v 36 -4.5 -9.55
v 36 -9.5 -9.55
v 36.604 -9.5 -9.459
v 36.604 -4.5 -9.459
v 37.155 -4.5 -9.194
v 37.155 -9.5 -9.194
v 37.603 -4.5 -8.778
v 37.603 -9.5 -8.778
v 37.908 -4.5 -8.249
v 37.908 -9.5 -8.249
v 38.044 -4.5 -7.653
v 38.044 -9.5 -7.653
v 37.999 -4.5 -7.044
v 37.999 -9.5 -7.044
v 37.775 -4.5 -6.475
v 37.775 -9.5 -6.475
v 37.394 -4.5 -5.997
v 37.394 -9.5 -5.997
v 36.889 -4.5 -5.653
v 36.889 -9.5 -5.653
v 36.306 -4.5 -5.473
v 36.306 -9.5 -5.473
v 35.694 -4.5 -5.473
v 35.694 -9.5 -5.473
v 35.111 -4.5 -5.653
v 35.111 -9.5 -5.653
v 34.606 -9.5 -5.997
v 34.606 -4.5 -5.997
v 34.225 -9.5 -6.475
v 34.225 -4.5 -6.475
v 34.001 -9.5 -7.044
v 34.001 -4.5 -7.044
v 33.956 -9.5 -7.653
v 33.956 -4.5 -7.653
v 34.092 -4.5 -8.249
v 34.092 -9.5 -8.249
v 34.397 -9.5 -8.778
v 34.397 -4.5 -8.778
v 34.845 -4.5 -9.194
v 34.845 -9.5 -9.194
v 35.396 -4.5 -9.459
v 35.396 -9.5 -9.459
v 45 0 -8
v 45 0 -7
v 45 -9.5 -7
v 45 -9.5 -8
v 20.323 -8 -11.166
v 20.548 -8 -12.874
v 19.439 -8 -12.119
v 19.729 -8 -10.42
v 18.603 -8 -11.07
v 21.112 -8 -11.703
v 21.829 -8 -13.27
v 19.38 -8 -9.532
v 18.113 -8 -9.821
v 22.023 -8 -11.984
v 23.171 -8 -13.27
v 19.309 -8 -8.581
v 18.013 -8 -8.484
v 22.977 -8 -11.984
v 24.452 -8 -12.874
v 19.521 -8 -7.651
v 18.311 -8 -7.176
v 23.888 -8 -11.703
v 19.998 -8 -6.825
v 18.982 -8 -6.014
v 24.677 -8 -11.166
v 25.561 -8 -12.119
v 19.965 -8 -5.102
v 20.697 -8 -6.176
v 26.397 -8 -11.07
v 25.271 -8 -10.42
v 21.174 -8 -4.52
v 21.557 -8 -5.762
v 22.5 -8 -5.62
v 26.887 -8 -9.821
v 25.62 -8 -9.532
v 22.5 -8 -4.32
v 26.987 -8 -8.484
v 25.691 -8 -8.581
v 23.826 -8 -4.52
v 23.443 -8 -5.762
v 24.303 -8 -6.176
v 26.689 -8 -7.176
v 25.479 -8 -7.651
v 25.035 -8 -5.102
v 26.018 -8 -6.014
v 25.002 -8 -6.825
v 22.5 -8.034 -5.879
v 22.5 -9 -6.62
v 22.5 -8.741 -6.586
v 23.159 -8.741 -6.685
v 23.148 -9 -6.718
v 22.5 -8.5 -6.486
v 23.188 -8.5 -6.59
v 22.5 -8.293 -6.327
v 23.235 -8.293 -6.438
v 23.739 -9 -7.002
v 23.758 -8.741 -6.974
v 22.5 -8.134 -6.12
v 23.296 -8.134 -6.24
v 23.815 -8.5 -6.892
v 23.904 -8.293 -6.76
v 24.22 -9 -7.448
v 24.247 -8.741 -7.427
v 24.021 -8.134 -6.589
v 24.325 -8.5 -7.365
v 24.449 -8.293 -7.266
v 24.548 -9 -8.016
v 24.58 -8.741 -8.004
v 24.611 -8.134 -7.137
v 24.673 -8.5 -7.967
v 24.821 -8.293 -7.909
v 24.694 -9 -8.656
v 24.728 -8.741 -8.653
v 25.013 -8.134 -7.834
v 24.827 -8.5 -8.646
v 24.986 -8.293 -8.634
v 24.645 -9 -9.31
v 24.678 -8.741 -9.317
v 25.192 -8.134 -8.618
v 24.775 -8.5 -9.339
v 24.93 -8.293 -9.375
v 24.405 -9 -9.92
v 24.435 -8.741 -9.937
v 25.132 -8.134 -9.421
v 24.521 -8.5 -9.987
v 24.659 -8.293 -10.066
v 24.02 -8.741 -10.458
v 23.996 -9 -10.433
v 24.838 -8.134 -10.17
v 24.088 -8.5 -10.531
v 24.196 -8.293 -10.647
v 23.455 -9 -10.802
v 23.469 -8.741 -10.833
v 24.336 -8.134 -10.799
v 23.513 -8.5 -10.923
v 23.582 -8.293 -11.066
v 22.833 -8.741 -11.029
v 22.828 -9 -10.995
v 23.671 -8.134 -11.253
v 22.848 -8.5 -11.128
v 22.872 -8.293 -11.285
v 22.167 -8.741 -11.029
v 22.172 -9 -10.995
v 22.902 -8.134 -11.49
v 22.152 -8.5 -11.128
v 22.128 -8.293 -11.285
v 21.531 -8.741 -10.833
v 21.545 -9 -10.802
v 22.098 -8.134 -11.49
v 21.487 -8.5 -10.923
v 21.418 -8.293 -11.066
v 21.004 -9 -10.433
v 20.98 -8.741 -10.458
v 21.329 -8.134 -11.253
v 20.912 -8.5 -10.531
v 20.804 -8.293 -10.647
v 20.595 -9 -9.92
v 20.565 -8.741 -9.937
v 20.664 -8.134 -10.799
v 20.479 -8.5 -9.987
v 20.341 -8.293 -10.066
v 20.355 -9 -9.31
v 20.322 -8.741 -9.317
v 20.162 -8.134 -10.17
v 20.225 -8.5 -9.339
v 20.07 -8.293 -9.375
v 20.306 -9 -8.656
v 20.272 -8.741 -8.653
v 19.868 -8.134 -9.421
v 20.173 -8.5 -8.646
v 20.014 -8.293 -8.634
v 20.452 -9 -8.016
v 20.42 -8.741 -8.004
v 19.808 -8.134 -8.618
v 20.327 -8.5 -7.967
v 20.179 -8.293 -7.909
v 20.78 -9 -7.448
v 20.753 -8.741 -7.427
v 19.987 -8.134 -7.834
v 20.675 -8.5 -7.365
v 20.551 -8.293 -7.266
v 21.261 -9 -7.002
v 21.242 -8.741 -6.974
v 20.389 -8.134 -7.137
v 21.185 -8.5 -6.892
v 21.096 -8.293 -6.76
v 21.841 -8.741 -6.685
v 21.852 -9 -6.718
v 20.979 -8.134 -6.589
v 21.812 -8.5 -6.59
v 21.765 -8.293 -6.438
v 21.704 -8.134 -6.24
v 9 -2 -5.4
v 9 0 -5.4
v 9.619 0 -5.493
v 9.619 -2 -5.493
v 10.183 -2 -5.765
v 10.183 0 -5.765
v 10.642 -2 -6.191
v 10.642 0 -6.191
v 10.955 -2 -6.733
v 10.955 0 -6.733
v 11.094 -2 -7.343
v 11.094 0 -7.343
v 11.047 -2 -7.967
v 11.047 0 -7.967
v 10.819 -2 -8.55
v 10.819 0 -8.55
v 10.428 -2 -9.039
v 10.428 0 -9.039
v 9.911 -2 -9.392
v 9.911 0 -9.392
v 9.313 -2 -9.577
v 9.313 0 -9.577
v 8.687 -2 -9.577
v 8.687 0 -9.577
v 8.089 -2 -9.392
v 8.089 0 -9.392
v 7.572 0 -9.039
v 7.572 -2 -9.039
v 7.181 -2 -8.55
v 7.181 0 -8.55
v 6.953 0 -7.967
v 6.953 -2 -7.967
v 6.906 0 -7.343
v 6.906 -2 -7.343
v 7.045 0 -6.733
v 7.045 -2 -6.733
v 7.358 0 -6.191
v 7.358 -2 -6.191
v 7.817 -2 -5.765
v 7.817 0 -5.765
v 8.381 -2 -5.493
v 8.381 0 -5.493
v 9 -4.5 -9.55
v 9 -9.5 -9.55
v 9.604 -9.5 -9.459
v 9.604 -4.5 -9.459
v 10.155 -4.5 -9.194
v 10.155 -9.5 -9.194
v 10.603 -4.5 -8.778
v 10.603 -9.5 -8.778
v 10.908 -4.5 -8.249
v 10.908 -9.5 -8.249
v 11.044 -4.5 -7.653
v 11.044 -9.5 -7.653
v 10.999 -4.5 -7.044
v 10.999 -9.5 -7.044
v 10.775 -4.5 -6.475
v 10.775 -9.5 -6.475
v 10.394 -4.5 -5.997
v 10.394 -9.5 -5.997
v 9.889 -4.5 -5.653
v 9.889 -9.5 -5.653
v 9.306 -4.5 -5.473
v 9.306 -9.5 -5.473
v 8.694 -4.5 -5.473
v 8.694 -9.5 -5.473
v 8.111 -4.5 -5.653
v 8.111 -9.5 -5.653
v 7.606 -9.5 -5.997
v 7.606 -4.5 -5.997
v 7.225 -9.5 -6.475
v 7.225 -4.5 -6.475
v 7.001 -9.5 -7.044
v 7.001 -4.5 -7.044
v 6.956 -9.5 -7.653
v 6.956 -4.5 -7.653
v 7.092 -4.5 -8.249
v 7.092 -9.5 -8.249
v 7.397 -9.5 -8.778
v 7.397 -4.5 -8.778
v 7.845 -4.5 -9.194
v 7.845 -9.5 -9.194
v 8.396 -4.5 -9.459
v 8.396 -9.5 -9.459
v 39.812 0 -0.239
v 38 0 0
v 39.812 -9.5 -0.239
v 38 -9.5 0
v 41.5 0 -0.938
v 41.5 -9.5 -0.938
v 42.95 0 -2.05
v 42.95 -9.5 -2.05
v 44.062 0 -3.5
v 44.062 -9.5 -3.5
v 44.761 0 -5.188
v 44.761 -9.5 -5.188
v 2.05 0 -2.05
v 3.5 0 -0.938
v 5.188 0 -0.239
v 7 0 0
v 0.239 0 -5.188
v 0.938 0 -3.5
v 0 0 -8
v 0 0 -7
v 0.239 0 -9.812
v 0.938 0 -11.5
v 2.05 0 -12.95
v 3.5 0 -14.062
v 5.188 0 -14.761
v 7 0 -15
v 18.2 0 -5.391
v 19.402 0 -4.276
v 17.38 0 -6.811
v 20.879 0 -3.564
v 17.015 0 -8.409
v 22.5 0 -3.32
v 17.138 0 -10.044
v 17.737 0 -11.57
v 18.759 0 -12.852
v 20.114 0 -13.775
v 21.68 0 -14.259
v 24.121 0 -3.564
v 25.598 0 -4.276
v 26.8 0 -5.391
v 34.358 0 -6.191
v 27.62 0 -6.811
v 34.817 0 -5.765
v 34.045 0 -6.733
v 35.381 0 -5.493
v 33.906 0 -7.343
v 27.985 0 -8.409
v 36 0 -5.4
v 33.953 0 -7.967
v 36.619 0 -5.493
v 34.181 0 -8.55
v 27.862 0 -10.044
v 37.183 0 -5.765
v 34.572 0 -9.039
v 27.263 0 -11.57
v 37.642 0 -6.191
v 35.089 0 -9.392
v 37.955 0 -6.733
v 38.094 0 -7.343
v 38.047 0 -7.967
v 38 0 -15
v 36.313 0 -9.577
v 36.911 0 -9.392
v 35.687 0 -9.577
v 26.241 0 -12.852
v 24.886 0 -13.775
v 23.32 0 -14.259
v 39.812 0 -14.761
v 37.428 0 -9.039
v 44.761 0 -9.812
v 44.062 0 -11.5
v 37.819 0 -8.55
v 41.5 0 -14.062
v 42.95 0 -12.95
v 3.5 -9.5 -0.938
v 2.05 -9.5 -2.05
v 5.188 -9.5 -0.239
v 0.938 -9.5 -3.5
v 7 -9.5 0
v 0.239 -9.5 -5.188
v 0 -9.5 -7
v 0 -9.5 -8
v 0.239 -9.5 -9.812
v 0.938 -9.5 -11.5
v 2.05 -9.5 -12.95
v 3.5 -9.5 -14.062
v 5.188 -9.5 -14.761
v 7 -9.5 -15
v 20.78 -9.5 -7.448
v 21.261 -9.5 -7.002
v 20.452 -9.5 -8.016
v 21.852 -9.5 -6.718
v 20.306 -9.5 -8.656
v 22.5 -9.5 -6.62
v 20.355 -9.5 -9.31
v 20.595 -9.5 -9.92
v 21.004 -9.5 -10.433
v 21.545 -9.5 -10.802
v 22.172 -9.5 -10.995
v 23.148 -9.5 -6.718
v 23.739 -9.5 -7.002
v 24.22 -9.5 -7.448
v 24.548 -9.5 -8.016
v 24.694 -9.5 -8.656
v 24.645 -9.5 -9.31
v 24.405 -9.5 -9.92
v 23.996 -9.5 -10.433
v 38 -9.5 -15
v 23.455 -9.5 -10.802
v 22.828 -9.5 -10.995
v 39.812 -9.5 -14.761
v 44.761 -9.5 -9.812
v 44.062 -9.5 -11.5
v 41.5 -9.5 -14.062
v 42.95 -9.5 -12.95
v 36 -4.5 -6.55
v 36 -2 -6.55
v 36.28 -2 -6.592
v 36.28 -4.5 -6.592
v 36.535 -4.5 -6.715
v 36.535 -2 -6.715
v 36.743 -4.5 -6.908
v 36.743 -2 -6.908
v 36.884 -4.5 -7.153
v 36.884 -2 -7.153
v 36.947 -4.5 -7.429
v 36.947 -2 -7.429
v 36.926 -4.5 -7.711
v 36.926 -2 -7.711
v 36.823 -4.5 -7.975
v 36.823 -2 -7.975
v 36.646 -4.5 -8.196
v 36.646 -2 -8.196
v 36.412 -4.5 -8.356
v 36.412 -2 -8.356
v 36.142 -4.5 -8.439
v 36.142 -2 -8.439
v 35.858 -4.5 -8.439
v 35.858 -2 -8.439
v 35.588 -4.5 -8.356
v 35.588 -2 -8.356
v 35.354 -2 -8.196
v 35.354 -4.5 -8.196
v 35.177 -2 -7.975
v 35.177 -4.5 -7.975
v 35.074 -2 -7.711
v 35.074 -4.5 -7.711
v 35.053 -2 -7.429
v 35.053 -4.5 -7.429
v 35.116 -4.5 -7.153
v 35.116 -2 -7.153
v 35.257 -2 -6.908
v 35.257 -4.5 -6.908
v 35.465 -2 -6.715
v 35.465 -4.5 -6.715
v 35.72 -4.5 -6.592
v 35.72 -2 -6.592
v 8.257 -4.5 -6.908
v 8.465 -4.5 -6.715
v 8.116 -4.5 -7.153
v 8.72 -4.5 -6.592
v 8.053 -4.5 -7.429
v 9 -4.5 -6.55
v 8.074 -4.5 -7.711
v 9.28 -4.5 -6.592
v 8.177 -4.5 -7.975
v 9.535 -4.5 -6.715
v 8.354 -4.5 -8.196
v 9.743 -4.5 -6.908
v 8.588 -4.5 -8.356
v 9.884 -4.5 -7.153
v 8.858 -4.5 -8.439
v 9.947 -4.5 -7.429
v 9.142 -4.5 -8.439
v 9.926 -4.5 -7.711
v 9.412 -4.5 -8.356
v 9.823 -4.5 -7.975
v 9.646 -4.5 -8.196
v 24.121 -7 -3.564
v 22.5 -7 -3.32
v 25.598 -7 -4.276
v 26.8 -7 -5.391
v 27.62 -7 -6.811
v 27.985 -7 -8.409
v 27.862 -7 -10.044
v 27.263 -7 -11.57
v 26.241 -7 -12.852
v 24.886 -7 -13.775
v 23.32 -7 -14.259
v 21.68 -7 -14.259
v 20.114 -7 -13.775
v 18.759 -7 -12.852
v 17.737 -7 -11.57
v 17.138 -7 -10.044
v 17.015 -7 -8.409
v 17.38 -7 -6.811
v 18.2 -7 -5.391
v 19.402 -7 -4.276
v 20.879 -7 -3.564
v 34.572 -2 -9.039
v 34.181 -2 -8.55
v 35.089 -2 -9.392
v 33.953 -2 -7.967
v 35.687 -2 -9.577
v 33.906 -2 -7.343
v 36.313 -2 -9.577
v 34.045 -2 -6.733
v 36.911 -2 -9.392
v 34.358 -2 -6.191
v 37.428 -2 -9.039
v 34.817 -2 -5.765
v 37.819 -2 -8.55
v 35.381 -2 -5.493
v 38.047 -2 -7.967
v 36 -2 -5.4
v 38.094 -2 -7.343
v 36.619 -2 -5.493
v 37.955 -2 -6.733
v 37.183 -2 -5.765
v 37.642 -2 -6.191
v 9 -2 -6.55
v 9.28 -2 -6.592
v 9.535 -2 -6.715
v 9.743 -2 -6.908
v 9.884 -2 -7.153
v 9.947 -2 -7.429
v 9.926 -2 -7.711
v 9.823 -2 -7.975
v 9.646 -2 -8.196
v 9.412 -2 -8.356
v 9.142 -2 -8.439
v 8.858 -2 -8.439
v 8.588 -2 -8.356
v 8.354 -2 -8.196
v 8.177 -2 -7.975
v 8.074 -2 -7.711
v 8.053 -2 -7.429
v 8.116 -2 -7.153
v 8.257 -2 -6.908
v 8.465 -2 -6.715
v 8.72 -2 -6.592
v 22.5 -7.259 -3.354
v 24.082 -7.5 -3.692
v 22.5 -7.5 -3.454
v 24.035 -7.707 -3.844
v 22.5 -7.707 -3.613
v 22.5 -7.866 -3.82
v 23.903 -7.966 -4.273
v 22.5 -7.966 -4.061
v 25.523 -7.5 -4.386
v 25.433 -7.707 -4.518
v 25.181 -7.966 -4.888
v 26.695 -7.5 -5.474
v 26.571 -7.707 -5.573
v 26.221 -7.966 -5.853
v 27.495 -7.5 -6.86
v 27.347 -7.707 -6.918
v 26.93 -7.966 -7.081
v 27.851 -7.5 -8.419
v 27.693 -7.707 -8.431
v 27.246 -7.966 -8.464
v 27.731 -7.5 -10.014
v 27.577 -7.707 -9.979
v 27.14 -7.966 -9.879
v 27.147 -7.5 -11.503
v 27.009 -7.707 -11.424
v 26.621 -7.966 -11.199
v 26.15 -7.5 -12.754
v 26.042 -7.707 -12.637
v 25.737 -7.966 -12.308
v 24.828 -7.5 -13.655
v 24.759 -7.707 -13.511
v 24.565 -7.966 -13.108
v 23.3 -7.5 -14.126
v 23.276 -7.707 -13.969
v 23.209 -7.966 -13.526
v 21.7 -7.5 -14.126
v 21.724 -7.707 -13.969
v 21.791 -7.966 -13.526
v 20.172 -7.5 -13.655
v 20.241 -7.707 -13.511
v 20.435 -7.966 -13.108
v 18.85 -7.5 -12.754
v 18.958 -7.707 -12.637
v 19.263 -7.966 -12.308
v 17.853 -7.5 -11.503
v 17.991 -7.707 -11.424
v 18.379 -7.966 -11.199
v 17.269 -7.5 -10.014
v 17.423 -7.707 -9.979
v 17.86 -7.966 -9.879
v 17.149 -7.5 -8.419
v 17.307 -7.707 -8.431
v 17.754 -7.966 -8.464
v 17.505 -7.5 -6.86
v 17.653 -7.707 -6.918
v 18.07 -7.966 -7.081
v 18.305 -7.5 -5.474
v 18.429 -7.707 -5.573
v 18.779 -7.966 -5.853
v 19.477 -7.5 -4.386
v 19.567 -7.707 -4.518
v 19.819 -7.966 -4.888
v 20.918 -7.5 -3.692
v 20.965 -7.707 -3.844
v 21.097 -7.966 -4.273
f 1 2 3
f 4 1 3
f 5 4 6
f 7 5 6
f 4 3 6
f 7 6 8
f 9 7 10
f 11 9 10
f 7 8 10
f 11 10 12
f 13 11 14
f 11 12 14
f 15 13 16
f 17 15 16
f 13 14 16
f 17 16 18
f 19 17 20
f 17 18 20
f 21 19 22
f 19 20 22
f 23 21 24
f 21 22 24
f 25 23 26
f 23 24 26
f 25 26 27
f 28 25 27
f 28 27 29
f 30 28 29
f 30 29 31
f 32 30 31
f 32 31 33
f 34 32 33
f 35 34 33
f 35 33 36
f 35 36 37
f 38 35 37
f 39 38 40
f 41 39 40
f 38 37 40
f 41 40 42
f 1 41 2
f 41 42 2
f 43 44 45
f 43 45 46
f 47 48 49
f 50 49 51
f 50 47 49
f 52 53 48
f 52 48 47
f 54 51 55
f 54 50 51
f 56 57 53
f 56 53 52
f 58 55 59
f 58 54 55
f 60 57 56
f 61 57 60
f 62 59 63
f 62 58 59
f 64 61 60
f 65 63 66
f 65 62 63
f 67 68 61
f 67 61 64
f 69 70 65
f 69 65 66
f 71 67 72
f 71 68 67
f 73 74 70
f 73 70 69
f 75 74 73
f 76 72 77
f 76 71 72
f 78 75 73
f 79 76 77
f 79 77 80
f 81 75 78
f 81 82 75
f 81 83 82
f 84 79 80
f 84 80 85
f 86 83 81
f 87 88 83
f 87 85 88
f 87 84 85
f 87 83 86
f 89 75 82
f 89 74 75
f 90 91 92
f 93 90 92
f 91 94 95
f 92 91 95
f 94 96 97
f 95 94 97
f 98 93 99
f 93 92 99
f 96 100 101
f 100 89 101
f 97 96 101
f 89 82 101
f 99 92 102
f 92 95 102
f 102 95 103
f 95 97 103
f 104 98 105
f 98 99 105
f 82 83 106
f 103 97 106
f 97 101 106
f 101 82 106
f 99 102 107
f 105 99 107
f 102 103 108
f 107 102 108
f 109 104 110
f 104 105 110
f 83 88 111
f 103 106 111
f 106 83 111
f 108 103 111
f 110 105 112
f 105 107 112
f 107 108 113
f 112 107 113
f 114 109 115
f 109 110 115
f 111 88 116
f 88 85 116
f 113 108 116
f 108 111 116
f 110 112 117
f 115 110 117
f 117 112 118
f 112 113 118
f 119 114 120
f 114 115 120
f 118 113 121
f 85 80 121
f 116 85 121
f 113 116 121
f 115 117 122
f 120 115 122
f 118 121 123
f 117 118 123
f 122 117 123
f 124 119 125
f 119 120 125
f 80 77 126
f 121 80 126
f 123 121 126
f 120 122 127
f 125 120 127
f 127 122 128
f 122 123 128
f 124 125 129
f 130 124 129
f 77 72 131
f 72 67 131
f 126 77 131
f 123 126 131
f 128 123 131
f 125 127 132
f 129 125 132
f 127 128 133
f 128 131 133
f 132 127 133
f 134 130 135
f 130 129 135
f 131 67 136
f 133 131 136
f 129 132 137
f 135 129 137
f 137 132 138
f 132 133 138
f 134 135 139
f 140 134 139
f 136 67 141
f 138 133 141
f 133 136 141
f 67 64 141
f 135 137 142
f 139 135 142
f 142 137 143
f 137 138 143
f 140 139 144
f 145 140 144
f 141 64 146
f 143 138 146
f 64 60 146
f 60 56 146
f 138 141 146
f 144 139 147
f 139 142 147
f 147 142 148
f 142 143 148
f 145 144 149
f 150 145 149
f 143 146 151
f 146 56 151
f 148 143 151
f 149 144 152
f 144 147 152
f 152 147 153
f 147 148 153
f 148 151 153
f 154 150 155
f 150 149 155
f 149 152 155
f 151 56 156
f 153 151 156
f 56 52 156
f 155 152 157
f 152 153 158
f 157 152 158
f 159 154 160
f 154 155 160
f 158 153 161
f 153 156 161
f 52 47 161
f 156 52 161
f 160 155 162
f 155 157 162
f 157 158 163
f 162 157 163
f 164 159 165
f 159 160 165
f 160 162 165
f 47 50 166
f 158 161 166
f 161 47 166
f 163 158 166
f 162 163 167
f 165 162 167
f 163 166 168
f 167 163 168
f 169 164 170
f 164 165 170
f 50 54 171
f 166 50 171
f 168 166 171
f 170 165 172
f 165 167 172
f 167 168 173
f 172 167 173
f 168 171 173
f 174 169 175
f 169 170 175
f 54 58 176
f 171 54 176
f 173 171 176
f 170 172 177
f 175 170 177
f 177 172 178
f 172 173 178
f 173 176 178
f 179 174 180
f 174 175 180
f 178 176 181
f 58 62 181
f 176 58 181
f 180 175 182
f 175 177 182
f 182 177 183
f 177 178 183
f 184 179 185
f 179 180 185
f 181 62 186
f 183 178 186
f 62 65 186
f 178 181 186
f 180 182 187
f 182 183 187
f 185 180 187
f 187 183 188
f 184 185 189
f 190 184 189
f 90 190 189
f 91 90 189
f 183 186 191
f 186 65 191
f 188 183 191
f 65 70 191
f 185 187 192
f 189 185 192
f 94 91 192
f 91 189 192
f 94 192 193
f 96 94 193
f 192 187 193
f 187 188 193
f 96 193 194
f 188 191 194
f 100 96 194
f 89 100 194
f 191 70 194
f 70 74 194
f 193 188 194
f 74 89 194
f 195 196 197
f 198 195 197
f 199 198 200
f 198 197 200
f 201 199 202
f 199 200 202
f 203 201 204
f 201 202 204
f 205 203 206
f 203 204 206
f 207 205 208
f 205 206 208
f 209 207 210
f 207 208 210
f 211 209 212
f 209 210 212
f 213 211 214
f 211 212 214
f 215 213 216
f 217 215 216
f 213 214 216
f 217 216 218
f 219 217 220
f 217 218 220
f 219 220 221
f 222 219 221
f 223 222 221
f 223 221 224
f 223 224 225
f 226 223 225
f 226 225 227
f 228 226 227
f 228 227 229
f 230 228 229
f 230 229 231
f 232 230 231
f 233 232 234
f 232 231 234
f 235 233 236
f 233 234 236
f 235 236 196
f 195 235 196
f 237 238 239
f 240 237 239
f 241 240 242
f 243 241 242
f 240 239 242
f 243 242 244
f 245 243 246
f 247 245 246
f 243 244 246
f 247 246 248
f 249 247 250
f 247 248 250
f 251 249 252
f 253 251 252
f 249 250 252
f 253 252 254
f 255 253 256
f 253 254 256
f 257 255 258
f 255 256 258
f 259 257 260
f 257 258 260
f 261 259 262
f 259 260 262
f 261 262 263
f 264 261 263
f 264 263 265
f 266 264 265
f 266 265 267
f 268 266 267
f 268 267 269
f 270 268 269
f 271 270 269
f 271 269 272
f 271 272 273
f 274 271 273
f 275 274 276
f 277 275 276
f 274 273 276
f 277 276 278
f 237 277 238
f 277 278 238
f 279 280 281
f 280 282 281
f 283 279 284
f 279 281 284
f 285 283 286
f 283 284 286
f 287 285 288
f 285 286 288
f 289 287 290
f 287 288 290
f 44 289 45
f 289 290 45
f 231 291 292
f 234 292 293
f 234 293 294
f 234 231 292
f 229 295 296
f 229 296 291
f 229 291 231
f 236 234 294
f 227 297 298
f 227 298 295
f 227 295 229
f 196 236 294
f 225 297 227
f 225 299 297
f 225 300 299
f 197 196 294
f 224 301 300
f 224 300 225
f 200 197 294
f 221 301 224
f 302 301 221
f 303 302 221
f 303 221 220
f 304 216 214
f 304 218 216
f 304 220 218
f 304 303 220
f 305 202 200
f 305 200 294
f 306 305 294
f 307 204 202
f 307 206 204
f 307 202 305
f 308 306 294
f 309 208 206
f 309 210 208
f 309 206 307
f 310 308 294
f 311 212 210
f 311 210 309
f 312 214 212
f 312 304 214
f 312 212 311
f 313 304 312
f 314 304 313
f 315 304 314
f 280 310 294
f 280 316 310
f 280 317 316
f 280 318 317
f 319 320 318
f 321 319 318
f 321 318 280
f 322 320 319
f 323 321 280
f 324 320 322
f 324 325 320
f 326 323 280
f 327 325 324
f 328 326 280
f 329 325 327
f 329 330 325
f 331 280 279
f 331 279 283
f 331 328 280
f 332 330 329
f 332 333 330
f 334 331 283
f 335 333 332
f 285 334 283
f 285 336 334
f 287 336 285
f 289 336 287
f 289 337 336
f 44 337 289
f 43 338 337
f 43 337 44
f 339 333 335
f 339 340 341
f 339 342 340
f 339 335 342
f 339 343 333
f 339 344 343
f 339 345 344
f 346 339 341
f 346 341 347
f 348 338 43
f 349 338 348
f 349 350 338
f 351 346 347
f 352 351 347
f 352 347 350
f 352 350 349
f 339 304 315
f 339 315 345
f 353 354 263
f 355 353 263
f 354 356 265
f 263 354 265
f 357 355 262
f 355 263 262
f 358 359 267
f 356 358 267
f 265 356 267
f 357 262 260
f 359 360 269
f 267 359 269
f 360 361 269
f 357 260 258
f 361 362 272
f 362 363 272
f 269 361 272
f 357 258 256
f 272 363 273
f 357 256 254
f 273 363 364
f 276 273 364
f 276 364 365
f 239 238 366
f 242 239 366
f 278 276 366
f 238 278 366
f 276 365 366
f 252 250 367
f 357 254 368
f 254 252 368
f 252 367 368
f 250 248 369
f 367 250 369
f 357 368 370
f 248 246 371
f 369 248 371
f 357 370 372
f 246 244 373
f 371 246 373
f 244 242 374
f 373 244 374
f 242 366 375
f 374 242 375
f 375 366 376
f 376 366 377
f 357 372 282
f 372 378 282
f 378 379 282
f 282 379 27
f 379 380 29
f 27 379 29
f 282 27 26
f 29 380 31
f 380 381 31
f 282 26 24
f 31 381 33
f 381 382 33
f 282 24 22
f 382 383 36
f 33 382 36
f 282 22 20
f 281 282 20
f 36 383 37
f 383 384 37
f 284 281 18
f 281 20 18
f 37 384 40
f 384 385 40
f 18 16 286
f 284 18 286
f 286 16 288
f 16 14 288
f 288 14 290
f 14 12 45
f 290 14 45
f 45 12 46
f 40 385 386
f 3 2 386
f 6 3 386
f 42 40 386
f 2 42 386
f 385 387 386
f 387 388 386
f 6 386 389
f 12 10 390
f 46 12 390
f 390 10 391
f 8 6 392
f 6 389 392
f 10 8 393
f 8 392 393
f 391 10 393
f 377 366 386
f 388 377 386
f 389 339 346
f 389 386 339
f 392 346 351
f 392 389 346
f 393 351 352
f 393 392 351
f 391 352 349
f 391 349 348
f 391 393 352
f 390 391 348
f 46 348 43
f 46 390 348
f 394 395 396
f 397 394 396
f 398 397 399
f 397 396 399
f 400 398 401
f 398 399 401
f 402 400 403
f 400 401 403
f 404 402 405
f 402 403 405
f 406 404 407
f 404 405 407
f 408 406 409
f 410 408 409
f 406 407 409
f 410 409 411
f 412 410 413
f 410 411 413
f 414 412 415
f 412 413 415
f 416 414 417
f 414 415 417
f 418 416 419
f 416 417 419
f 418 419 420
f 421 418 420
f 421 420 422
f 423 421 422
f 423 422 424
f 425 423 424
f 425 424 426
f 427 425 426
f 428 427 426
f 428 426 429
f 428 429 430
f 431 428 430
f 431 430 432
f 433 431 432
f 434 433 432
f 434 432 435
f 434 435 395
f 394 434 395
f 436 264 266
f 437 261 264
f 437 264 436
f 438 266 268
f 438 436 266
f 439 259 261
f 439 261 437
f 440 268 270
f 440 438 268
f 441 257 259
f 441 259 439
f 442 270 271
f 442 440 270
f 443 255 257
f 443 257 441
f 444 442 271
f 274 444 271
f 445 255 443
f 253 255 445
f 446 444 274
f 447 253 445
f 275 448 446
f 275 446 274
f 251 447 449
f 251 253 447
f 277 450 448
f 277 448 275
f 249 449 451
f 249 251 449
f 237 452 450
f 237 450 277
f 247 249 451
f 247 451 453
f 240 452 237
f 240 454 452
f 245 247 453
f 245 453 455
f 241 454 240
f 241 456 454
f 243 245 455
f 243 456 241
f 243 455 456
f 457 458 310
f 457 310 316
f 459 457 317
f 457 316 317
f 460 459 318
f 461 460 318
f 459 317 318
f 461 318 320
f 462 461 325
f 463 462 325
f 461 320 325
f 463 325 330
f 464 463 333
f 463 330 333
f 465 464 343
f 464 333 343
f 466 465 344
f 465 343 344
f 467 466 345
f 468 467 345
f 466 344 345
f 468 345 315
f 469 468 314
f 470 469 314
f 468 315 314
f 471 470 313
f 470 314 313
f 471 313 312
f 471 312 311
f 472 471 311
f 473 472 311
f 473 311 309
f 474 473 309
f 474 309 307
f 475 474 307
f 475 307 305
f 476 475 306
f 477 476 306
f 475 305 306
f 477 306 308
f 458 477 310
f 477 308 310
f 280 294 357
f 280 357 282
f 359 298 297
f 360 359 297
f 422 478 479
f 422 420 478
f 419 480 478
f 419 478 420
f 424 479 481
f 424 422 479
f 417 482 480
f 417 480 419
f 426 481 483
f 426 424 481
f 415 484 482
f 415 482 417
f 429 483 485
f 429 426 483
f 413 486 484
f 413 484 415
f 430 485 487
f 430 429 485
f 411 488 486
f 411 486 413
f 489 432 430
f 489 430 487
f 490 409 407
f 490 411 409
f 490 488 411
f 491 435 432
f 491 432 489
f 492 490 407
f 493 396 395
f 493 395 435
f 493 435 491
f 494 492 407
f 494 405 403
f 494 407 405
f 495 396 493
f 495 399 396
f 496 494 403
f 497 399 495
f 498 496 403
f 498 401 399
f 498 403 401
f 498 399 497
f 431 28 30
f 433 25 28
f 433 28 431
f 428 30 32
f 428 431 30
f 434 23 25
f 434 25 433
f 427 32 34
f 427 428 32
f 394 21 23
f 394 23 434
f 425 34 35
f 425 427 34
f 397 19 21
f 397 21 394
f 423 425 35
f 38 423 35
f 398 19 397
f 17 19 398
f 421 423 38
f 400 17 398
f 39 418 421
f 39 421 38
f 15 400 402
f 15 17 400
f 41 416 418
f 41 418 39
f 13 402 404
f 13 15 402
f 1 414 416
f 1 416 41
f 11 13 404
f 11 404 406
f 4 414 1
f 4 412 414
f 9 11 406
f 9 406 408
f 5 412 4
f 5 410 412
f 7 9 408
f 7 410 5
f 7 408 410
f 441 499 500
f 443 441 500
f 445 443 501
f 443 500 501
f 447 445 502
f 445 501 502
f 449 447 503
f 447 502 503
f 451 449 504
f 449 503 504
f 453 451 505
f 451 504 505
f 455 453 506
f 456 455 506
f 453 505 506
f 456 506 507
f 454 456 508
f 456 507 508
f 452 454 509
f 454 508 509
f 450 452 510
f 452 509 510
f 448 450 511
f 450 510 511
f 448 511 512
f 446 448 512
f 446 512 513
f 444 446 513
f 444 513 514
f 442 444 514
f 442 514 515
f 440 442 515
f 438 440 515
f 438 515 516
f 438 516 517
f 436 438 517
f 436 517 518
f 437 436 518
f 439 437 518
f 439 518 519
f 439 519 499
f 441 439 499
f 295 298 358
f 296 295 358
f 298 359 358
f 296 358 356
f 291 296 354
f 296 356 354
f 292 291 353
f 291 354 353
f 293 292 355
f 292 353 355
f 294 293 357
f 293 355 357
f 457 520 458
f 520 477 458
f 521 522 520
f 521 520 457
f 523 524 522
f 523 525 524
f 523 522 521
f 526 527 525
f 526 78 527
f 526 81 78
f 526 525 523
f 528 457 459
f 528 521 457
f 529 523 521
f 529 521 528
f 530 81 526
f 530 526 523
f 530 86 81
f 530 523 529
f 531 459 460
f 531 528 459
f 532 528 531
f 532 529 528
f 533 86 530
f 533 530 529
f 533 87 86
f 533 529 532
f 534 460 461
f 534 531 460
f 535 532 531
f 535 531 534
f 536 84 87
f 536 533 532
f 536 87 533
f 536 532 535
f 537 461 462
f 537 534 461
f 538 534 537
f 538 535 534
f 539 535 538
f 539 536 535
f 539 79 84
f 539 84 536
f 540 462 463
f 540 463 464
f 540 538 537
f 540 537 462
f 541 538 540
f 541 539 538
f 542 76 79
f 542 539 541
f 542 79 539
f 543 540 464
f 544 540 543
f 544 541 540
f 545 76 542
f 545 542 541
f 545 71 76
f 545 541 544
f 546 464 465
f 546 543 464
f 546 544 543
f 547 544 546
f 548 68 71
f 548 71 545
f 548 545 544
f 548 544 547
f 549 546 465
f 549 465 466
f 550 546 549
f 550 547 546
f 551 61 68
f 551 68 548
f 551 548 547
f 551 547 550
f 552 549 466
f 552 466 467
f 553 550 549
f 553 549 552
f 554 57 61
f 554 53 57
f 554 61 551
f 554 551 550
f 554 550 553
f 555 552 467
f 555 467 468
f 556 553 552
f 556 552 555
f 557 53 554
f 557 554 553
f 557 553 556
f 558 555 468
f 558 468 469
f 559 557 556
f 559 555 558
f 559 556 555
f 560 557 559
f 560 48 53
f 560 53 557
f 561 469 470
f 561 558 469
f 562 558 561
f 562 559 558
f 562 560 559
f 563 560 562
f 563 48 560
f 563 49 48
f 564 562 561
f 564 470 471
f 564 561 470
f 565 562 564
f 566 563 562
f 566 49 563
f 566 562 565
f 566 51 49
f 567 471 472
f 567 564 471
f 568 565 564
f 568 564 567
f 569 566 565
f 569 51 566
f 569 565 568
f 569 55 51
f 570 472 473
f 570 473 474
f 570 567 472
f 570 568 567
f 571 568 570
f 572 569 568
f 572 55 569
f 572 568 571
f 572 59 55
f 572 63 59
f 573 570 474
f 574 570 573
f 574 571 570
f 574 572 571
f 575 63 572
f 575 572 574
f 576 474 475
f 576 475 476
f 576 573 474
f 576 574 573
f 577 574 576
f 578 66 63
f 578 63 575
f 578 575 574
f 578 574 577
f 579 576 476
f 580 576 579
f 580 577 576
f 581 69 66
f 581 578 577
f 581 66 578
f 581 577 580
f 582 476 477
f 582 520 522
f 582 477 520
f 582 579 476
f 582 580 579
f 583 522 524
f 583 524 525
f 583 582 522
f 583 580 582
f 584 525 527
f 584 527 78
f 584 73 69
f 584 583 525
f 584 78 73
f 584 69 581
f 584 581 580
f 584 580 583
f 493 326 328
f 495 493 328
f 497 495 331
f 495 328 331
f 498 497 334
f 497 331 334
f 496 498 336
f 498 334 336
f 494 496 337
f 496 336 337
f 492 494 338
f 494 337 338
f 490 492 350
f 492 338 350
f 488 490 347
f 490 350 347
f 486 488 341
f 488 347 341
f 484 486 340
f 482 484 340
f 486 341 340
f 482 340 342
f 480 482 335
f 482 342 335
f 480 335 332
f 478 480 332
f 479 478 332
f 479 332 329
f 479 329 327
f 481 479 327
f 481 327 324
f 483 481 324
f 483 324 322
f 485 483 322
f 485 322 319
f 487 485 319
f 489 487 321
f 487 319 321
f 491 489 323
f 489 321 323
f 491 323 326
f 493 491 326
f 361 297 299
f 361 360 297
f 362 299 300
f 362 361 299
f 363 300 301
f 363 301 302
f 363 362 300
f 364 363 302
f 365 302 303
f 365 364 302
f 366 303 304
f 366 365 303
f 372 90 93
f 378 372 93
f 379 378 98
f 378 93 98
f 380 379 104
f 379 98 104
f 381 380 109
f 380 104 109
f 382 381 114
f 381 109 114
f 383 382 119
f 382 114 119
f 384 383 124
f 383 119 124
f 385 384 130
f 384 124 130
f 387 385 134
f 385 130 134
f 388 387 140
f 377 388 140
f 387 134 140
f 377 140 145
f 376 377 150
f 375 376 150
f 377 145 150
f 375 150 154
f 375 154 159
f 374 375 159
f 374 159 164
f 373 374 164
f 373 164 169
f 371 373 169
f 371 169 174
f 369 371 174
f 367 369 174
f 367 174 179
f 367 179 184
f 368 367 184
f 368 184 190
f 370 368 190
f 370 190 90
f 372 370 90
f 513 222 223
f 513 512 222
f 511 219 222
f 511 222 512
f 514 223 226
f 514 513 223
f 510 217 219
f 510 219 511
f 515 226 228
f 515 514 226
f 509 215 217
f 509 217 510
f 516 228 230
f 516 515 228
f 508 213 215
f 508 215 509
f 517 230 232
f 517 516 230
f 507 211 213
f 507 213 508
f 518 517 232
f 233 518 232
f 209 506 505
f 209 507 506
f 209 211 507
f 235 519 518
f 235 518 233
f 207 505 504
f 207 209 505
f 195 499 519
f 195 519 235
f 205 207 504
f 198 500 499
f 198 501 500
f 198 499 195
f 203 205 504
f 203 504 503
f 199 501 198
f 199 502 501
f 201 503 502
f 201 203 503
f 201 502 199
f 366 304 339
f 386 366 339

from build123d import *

# Parameters (mm, degrees)
SKETCH1_W           = 45
SKETCH1_H           = 15
BOSS_EXTRUDE1_DEPTH = 9.5
SKETCH2_R           = 5.5
CUT_EXTRUDE1_DEPTH  = 8
CUT_EXTRUDE2_REACH  = 50.104
SKETCH3_R           = 2.2
SKETCH4_R           = 2.1
CUT_EXTRUDE3_DEPTH  = 2
FILLET1_R           = 7
SKETCH5_R           = 2.05
CUT_EXTRUDE4_DEPTH  = 5
SKETCH6_R           = 0.95
CUT_EXTRUDE5_DEPTH  = 3
FILLET5_R           = 1


with BuildPart() as part:
    # Sketch1 → Boss-Extrude1 (new body)
    with BuildSketch(Plane(origin=(0, 0, 0), x_dir=(1, 0, 0), z_dir=(0, 1, 0))):
        with Locations((22.5, 7.5)):
            Rectangle(SKETCH1_W, SKETCH1_H)
    extrude(amount=-BOSS_EXTRUDE1_DEPTH)

    # Sketch2 → Cut-Extrude1 (cut)
    with BuildSketch(Plane(origin=(0, 0, 0), x_dir=(1, 0, 0), z_dir=(0, 1, 0))):
        with Locations(Location((22.5, 8.82, 0), (0, 0, 270))):
            Circle(SKETCH2_R)
    extrude(amount=-CUT_EXTRUDE1_DEPTH, mode=Mode.SUBTRACT)

    # Sketch3 → Cut-Extrude2 (cut, up to next)
    with BuildSketch(Plane(origin=(0, -8, 0), x_dir=(1, 0, 0), z_dir=(0, 1, 0)), mode=Mode.PRIVATE) as cut_extrude2_sk1:
        with Locations(Location((22.5, 8.82, 0), (0, 0, 270))):
            Circle(SKETCH3_R)
    cut_extrude2_tool1 = extrude(cut_extrude2_sk1.sketch, amount=-CUT_EXTRUDE2_REACH, mode=Mode.PRIVATE) & part.part
    add(cut_extrude2_tool1.solids().sort_by_distance((22.5, -8, -8.82))[0], mode=Mode.SUBTRACT)

    # Sketch4 → Cut-Extrude3 (cut)
    with BuildSketch(Plane(origin=(0, 0, 0), x_dir=(1, 0, 0), z_dir=(0, 1, 0))):
        with Locations(Location((9, 7.5, 0), (0, 0, 270))):
            Circle(SKETCH4_R)
        with Locations(Location((36, 7.5, 0), (0, 0, 270))):
            Circle(SKETCH4_R)
    extrude(amount=-CUT_EXTRUDE3_DEPTH, mode=Mode.SUBTRACT)

    # Fillet1
    fillet1_edges = [part.edges().sort_by_distance(p)[0] for p in [
        (0, -4.75, -15),
        (45, -4.75, -15),
        (45, -4.75, 0),
        (0, -4.75, 0),
    ]]
    fillet(fillet1_edges, radius=FILLET1_R)

    # Sketch5 → Cut-Extrude4 (cut)
    with BuildSketch(Plane(origin=(0, -9.5, 0), x_dir=(-1, 0, 0), z_dir=(0, -1, 0))):
        with Locations(Location((-36, 7.5, 0), (0, 0, 90))):
            Circle(SKETCH5_R)
        with Locations(Location((-9, 7.5, 0), (0, 0, 90))):
            Circle(SKETCH5_R)
    extrude(amount=-CUT_EXTRUDE4_DEPTH, mode=Mode.SUBTRACT)

    # Sketch6 → Cut-Extrude5 (cut)
    with BuildSketch(Plane(origin=(0, -2, 0), x_dir=(1, 0, 0), z_dir=(0, 1, 0))):
        with Locations(Location((9, 7.5, 0), (0, 0, 270))):
            Circle(SKETCH6_R)
        with Locations(Location((36, 7.5, 0), (0, 0, 270))):
            Circle(SKETCH6_R)
    extrude(amount=-CUT_EXTRUDE5_DEPTH, mode=Mode.SUBTRACT)

    # Fillet5
    fillet5_edges = [part.edges().sort_by_distance(p)[0] for p in [
        (22.5, -8, -14.32),
        (22.5, -8, -11.02),
    ]]
    fillet(fillet5_edges, radius=FILLET5_R)


solid = part.part
